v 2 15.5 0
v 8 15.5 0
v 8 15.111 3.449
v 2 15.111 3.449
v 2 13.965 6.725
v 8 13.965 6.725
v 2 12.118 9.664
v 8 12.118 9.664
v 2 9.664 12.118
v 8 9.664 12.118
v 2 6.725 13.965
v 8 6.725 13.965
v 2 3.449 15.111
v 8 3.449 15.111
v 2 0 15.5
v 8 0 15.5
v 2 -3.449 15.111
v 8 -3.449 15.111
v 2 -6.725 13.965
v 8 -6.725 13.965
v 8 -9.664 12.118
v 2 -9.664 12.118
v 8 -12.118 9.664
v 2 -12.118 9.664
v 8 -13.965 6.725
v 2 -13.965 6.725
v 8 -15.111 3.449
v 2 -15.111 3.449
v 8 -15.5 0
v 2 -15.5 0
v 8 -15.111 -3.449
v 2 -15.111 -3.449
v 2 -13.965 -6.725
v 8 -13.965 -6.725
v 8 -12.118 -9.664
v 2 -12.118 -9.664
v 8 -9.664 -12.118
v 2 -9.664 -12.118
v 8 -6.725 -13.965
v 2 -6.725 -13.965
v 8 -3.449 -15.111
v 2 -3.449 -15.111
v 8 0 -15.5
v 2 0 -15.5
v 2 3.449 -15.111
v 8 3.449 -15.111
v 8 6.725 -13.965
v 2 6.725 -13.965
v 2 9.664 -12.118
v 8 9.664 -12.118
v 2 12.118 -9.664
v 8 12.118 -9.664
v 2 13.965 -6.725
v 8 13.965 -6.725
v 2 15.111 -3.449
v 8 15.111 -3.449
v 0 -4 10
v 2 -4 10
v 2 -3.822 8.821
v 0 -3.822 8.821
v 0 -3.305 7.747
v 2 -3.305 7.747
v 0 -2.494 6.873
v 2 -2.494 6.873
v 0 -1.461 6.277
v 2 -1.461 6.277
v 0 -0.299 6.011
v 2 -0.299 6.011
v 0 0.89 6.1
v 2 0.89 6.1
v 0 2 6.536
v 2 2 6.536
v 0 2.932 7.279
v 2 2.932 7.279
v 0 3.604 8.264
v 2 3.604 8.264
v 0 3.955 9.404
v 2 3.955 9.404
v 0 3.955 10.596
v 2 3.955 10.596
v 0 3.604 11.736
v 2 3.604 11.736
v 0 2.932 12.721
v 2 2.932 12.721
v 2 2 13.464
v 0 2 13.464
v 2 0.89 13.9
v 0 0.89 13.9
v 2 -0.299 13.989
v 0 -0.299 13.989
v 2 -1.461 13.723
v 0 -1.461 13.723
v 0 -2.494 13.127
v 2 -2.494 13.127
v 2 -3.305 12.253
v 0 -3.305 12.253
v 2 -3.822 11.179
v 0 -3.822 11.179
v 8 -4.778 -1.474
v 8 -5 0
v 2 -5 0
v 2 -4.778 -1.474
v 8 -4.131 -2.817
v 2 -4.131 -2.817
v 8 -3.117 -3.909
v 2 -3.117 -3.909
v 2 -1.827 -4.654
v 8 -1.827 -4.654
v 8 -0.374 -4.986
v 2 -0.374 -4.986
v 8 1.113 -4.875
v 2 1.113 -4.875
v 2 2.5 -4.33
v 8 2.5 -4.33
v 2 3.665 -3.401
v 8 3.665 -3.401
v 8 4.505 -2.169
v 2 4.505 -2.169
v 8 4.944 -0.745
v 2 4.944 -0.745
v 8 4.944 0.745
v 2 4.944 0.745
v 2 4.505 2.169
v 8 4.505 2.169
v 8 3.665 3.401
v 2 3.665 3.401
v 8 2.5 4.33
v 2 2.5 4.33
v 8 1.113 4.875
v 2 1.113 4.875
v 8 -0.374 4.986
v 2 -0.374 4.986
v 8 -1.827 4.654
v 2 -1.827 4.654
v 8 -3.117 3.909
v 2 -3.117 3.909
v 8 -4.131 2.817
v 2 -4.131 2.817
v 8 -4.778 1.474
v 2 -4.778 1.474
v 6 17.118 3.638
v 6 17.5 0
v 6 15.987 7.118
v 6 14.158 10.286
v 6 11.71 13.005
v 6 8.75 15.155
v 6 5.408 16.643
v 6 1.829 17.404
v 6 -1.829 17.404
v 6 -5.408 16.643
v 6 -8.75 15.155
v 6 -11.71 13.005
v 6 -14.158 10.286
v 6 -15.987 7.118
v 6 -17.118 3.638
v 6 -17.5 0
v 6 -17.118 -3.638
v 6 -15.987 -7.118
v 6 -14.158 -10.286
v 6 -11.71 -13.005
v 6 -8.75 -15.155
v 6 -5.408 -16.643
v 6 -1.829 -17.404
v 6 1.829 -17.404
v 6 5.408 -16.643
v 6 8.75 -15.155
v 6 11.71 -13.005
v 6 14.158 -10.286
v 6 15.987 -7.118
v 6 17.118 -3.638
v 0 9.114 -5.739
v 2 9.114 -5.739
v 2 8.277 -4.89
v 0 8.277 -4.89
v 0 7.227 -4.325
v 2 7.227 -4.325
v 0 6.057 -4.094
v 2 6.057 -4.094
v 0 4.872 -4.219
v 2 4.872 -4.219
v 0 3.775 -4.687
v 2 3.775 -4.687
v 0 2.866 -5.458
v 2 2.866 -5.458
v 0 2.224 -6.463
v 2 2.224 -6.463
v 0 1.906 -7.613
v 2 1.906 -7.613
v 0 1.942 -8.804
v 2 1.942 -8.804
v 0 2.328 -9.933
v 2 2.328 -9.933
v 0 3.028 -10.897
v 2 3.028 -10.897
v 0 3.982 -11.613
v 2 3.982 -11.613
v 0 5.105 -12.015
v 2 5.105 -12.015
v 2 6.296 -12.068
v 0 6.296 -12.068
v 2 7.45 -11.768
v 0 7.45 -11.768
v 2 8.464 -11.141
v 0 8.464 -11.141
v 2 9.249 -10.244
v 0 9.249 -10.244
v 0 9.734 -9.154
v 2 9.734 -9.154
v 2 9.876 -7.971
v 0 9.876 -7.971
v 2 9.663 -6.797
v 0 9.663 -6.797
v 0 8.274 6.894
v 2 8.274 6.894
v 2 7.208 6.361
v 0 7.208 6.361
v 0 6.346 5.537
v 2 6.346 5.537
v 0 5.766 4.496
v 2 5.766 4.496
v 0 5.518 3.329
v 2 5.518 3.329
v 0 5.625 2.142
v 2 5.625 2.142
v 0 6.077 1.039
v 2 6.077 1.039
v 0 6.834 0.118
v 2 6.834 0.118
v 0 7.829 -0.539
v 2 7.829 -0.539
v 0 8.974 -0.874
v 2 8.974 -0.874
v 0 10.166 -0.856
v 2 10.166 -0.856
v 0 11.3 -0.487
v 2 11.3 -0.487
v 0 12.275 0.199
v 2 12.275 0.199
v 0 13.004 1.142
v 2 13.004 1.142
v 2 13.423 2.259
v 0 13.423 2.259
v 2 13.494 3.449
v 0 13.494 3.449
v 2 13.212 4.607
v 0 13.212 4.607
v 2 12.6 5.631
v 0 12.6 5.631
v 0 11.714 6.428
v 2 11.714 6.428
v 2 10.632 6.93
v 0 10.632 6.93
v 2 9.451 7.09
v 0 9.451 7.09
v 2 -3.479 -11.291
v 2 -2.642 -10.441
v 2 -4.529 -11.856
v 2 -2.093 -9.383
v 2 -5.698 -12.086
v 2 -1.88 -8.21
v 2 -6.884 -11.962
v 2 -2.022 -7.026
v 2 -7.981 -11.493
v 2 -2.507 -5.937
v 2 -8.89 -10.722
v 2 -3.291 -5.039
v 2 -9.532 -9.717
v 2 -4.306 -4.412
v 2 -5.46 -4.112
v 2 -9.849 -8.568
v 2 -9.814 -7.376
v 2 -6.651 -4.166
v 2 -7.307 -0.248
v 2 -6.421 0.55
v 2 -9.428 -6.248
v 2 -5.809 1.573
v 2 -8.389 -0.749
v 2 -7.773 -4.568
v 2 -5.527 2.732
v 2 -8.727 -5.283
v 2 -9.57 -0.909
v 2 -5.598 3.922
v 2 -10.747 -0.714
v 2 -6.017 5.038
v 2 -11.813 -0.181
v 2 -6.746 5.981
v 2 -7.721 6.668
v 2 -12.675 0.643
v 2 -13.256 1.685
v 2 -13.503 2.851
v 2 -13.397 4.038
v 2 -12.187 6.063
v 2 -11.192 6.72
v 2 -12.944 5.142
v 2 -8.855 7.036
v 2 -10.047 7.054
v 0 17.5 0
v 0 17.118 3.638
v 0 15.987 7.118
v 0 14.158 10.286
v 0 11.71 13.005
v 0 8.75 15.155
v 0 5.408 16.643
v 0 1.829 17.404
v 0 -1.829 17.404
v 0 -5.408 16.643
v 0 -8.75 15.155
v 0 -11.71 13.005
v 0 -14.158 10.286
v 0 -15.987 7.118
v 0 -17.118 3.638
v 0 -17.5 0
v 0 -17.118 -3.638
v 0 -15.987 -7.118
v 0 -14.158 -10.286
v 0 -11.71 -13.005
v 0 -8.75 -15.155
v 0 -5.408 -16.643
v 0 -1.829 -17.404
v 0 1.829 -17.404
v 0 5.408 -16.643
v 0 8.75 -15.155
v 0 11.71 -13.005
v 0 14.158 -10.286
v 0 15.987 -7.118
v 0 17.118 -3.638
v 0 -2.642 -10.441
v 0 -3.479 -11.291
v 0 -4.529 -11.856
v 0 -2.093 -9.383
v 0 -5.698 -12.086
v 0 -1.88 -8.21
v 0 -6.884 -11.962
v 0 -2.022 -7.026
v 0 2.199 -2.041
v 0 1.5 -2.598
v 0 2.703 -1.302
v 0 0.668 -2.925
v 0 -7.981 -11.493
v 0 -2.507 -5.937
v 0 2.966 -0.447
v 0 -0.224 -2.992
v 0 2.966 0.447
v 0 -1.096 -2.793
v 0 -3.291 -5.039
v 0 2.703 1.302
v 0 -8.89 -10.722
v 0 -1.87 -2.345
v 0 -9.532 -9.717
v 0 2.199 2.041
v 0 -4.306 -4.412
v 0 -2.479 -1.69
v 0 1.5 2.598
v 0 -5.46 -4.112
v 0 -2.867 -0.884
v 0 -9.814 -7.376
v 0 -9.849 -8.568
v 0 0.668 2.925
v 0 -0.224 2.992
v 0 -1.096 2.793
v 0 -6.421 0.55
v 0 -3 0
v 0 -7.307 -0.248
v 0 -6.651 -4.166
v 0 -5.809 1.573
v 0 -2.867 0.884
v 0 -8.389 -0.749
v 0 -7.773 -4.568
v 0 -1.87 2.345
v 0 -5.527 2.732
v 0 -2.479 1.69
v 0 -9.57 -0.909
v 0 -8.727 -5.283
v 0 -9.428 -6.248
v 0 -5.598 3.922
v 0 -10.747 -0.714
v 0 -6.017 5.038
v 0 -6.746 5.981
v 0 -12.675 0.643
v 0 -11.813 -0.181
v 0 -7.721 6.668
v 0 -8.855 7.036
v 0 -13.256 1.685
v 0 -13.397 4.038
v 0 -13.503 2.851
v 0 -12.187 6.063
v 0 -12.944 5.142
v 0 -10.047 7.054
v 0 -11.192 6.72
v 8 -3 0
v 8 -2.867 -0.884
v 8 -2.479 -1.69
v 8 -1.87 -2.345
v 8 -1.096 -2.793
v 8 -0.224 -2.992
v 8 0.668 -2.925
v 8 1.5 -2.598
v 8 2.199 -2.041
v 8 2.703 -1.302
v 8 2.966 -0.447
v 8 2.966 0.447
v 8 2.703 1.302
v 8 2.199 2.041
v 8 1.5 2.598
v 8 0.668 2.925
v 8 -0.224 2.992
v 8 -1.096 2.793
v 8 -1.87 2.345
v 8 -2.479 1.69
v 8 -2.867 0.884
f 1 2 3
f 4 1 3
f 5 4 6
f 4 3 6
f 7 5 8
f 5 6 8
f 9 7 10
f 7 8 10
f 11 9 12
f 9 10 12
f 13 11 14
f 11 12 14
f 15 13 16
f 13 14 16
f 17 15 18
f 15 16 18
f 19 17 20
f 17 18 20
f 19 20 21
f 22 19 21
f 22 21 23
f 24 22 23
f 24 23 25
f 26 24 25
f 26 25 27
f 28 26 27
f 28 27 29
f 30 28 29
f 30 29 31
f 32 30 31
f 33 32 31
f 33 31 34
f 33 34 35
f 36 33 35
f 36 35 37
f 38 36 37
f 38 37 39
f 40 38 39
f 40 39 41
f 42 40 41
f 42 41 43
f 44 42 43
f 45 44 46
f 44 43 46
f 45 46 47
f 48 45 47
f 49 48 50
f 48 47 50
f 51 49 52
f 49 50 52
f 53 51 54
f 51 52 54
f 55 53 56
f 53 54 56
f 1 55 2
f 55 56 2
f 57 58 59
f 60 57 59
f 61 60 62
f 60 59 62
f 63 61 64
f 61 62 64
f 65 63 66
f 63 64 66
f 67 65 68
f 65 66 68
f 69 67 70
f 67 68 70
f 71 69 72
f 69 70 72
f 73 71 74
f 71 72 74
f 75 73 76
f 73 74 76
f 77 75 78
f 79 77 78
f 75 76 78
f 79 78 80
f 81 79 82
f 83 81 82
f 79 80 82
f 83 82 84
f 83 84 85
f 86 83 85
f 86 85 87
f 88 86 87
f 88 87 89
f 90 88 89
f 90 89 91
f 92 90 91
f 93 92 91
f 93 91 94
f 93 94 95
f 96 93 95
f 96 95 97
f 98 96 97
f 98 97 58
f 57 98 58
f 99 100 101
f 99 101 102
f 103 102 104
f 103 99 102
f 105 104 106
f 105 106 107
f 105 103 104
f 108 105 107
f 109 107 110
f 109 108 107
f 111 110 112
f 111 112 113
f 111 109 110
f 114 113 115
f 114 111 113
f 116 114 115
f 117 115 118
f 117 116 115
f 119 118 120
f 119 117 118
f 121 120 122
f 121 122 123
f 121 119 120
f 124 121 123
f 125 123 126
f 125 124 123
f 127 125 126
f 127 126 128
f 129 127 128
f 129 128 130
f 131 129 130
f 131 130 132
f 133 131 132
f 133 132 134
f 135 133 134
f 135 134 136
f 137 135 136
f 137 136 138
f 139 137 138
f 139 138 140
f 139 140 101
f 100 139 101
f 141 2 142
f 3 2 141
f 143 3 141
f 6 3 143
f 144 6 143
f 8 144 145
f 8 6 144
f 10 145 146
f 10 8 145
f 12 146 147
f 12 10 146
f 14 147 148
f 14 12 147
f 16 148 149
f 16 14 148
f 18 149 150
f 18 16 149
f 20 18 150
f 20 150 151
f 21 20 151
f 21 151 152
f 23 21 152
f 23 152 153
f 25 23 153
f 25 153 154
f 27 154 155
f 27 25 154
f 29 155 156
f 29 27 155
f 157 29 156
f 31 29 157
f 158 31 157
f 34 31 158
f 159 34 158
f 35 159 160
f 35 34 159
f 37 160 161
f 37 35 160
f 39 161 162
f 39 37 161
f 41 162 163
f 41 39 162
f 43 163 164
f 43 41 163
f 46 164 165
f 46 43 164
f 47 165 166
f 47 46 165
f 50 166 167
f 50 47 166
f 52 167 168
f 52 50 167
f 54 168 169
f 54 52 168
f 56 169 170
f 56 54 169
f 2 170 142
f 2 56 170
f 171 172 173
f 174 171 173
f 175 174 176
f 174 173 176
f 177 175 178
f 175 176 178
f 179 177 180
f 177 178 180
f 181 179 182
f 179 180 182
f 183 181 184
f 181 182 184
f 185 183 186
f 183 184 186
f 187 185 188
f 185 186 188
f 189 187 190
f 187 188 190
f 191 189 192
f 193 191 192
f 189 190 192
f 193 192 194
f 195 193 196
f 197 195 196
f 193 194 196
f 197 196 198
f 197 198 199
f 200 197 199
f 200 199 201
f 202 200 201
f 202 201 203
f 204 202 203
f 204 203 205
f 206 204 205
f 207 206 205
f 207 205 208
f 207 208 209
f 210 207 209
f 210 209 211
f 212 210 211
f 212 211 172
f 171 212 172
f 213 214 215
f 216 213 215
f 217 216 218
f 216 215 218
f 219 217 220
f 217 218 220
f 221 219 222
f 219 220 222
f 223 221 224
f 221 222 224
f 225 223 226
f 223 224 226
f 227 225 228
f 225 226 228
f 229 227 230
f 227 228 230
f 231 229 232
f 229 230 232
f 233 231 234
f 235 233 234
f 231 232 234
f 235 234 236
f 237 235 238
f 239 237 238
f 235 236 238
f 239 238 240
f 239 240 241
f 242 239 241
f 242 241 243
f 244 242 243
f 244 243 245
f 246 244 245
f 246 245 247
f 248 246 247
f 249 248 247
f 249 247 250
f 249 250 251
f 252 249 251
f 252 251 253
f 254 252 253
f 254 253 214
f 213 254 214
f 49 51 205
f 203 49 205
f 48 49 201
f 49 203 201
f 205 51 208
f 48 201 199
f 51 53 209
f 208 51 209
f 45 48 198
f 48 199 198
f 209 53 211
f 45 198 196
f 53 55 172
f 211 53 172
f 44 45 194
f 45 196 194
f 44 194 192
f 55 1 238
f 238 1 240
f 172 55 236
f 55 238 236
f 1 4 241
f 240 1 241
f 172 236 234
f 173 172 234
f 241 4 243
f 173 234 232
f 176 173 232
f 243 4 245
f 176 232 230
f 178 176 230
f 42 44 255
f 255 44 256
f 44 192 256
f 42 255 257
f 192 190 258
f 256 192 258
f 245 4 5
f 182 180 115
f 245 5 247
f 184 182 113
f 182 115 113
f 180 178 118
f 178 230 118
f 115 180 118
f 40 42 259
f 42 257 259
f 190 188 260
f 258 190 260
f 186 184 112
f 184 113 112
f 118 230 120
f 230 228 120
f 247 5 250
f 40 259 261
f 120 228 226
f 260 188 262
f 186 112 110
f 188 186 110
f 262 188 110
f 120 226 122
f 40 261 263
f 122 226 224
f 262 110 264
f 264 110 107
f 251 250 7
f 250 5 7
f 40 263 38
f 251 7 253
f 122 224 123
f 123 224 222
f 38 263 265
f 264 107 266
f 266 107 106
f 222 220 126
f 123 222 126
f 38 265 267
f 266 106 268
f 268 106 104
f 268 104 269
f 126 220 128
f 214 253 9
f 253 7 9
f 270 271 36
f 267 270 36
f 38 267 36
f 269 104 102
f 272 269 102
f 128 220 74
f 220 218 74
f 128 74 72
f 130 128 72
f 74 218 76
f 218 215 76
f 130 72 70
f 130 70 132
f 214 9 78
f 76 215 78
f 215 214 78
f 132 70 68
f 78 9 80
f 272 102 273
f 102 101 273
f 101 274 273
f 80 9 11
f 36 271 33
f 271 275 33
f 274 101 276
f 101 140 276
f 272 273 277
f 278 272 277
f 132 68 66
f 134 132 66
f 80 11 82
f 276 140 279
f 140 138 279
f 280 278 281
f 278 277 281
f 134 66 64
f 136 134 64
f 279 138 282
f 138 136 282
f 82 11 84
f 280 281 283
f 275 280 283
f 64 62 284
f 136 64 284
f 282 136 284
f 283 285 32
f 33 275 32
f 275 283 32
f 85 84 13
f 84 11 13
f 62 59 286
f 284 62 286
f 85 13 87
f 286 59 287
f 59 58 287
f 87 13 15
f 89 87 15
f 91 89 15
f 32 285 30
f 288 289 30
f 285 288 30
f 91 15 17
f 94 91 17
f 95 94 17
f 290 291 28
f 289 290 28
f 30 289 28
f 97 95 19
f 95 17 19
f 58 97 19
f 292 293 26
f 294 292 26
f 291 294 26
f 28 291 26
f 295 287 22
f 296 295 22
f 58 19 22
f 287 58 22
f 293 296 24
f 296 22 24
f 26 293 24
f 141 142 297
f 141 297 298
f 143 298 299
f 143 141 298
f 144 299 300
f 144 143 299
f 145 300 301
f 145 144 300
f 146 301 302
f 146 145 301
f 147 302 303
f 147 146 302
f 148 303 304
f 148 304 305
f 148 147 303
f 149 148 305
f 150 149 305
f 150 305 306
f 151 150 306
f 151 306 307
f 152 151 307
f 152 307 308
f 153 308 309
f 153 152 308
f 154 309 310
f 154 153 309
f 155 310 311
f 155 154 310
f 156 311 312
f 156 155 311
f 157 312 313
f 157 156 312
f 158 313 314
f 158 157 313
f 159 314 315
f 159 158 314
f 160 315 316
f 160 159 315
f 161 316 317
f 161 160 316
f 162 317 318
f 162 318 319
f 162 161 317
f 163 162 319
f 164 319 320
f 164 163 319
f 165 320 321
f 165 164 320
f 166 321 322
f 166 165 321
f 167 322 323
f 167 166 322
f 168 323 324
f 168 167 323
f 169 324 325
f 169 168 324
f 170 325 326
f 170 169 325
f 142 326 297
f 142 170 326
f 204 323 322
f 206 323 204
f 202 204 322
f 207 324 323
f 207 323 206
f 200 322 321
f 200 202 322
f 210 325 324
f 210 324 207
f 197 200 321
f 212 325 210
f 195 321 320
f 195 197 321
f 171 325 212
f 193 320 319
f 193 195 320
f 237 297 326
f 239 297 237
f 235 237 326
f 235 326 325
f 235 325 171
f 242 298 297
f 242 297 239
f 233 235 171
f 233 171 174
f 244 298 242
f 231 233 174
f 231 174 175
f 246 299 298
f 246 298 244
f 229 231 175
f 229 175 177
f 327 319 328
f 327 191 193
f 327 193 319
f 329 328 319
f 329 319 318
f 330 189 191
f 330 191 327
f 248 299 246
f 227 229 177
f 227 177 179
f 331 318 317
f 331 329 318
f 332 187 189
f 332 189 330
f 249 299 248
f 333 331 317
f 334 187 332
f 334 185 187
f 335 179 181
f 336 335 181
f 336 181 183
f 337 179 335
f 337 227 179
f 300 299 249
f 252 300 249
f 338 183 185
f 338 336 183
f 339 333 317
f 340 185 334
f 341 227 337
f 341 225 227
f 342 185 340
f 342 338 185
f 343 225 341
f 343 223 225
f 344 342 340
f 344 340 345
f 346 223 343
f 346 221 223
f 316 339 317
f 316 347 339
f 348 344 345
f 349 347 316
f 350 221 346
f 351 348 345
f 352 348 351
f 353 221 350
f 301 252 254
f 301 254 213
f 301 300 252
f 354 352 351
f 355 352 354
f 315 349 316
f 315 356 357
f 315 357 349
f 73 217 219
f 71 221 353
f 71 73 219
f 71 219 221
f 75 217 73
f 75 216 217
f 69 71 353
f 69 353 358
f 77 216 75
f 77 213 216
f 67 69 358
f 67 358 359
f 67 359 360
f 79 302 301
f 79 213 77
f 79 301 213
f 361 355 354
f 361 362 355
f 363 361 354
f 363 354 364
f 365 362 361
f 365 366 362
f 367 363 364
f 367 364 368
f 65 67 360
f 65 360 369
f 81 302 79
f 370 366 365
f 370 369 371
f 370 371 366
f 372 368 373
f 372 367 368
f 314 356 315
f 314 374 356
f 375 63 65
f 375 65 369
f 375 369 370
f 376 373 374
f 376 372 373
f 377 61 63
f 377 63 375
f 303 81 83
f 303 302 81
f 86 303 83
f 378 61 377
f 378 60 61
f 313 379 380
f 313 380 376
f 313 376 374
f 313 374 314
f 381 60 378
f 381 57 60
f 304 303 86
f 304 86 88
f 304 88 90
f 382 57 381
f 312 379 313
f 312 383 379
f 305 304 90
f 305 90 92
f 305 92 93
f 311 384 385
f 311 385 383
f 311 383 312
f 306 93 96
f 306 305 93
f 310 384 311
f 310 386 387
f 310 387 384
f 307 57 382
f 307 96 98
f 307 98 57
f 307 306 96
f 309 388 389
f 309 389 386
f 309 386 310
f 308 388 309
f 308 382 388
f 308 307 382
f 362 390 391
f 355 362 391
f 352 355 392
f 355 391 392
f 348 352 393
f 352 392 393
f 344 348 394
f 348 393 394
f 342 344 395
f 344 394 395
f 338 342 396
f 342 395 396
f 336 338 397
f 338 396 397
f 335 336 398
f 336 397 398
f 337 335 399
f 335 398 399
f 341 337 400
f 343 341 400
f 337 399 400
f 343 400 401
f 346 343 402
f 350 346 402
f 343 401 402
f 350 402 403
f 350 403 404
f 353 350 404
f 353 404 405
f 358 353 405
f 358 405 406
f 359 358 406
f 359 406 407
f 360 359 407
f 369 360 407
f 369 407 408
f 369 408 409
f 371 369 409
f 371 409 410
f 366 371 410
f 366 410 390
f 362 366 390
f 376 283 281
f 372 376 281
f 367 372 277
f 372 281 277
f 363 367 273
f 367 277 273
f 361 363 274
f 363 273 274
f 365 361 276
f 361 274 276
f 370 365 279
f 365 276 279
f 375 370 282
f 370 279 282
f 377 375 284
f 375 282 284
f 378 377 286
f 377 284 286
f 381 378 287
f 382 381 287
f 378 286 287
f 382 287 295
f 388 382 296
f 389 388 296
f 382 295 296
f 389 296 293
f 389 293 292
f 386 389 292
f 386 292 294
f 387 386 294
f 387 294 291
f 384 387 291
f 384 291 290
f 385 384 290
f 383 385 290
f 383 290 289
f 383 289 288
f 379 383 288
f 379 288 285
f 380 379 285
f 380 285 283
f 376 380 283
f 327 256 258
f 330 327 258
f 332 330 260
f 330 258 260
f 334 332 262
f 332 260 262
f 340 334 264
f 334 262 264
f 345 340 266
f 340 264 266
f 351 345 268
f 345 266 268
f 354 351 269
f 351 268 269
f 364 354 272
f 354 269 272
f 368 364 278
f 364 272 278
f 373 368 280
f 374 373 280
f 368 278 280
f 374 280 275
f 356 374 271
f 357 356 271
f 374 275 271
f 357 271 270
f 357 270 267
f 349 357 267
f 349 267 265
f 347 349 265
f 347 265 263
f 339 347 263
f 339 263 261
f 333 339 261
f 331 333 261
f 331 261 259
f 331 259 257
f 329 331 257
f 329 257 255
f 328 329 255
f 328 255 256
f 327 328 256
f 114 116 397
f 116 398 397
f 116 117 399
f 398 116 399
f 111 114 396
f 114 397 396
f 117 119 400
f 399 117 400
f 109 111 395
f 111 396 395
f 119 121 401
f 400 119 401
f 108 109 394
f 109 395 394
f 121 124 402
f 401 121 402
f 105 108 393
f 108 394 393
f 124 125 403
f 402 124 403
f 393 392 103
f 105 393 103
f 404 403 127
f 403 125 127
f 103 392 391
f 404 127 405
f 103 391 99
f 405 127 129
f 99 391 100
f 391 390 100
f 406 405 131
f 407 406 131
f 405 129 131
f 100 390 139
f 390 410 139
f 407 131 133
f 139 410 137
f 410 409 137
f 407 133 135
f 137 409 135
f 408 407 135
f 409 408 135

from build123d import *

# Parameters (mm, degrees)
F0_W            = 8
F0_H            = 17.5
F3_D            = 6
F3_DEPTH        = 12
F3_TIP          = 1.8025818571
F4_T            = -2
F6_D            = 8
F6_DEPTH        = 12
F6_TIP          = 2.4034424761
F6_COPIES_COUNT = 5
F7_SIZE         = 1.99999


# Not quite as in the source:
# - a fillet or chamfer is up to 0.001 mm smaller than in the source, because OpenCascade refuses the exact size
# - a pattern or mirror of a feature is missing from the dataset's text; its kind, count and spacing are read off the source's solid


with BuildPart() as f1:
    # F0 (on Top) → F1 (revolve)
    with BuildSketch(Plane.XY):
        with Locations((4, 8.75)):
            Rectangle(F0_W, F0_H)
    revolve(axis=Axis((4, 0, 0), (1, 0, 0)))

    # F3
    with Locations(Plane(origin=(0, 0, 0), x_dir=(0, 1, 0), z_dir=(-1, 0, 0))):
        with Locations((0, 0)):
            Hole(F3_D / 2, depth=F3_DEPTH)
            with Locations((0, 0, -(F3_DEPTH + F3_TIP / 2))):  # 118° drill point
                Cone(0, F3_D / 2, F3_TIP, mode=Mode.SUBTRACT)

    # F4
    f4_openings = [f1.faces().sort_by_distance(p)[0] for p in [
        (8, -17.005025, 0),
    ]]
    offset(amount=F4_T, openings=f4_openings)

    # F6
    with Locations(Plane(origin=(0, 0, 0), x_dir=(0, 1, 0), z_dir=(-1, 0, 0))):
        with Locations((0, -10)):
            f6 = Hole(F6_D / 2, depth=F6_DEPTH)
            with Locations((0, 0, -(F6_DEPTH + F6_TIP / 2))):  # 118° drill point
                Cone(0, F6_D / 2, F6_TIP, mode=Mode.SUBTRACT)

    # F6_copies: F6 ×5 about axis
    f6_copies_axis = Axis((0, 0, 0), (1, 0, 0))
    for i in range(1, F6_COPIES_COUNT):
        add(f6.rotate(f6_copies_axis, i * 360 / F6_COPIES_COUNT), mode=Mode.SUBTRACT)

    # F7 (size 2 in the source; OpenCascade refuses exactly that, so slightly less here)
    f7_edges = [f1.edges().sort_by_distance(p)[0] for p in [
        (8, -17.5, 0),
    ]]
    chamfer(f7_edges, length=F7_SIZE)


solid = f1.part
